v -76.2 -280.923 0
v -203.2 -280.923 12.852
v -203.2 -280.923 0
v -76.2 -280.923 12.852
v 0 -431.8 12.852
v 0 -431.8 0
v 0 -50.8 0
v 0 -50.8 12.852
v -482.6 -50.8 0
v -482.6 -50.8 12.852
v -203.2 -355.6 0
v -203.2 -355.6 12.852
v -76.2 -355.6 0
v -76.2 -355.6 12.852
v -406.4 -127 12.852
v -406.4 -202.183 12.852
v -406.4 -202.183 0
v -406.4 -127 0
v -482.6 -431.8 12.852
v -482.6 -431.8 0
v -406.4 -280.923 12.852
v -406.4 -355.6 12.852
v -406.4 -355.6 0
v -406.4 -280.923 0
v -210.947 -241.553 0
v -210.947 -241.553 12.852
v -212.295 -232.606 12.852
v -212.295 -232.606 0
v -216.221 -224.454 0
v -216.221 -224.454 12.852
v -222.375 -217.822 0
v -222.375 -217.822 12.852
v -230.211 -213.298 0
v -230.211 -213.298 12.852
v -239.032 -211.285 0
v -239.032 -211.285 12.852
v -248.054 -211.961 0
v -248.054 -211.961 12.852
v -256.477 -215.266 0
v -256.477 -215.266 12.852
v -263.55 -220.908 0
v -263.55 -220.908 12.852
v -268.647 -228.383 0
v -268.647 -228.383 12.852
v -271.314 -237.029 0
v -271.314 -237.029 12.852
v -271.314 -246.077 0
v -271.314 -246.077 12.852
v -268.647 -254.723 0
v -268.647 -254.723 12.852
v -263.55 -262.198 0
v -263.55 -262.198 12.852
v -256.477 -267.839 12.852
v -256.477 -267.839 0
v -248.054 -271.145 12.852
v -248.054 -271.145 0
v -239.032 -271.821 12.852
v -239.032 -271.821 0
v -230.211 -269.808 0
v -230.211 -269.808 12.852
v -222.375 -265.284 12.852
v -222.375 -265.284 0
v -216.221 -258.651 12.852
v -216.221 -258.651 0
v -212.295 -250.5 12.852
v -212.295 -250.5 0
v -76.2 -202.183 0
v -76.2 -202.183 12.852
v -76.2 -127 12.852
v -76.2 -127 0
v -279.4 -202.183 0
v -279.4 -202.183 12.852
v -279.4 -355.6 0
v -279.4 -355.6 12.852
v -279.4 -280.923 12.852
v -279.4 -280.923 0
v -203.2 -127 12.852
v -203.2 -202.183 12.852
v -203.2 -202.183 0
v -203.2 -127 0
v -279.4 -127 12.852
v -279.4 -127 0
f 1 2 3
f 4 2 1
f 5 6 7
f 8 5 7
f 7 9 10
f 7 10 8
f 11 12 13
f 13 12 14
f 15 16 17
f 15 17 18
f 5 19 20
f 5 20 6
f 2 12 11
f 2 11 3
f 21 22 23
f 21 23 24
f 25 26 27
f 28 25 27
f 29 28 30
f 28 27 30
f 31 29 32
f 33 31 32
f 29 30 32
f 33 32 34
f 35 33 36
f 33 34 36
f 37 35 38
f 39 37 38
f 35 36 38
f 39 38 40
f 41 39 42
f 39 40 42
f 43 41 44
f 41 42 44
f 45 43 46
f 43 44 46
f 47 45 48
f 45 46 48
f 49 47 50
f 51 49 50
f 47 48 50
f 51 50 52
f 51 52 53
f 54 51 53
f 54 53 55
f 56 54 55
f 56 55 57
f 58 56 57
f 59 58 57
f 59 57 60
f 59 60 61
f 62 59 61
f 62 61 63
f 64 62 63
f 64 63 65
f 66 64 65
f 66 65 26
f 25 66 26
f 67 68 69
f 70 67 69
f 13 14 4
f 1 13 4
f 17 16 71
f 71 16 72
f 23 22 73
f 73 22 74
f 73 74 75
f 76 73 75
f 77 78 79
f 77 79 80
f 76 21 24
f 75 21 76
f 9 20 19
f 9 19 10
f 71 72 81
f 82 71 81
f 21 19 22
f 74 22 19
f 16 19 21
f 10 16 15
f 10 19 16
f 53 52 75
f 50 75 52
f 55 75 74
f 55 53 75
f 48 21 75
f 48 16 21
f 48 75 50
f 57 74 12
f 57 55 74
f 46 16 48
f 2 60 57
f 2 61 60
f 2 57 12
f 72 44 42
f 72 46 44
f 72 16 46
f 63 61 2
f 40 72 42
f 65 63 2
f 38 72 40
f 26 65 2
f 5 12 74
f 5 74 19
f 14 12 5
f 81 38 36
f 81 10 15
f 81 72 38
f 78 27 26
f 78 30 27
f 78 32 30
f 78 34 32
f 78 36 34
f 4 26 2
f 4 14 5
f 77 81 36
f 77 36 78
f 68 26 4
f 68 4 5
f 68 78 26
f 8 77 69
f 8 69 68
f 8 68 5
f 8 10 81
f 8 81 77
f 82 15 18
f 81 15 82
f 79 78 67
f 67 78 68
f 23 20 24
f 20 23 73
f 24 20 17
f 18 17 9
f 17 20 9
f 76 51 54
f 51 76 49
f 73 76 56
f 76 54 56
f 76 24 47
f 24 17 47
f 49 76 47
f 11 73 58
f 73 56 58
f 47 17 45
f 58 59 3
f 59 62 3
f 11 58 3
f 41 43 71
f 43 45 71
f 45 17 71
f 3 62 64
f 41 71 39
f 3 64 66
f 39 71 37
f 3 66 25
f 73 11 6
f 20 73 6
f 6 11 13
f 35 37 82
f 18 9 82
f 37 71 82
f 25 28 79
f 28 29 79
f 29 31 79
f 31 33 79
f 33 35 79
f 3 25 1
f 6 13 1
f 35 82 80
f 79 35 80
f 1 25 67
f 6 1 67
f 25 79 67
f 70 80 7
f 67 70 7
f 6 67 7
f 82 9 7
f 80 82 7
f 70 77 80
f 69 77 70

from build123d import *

# Parameters (mm, degrees)
F0_W      = 482.6
F0_H      = 482.6
F1_DEPTH  = 12.8524
F2_W      = 330.2
F2_H      = 12.8524
F2_W_2    = 76.2
F3_DEPTH  = 50.8
F4_W      = 330.2
F4_H      = 12.8524
F4_W_2    = 76.2
F5_DEPTH  = 50.8
F8_W      = 127
F8_H      = 74.6771698952
F8_H_2    = 75.1828301048
F9_W      = 127
F9_H      = 74.6771698952
F10_DEPTH = 25.4
F12_DEPTH = 50.8
F13_DEPTH = 50.8
F14_R     = 30.353
F15_DEPTH = 25.4


with BuildPart() as f1:
    # F0 (on Top) → F1 (new body)
    with BuildSketch(Plane.XY):
        with Locations((-241.3, -241.3)):
            Rectangle(F0_W, F0_H)
    extrude(amount=F1_DEPTH)

    # F2 (on face) → F3 (cut)
    with BuildSketch(Plane.XZ.offset(482.6)):
        with Locations((-241.3, 6.4262)):
            Rectangle(F2_W, F2_H)
        with Locations((-444.5, 6.4262)):
            Rectangle(F2_W_2, F2_H)
    extrude(amount=-F3_DEPTH, mode=Mode.SUBTRACT)

    # F4 (on face) → F5 (cut)
    with BuildSketch(Plane(origin=(0, 0, 0), x_dir=(-1, 0, 0), z_dir=(0, 1, 0))):
        with Locations((241.3, 6.4262)):
            Rectangle(F4_W, F4_H)
        with Locations((38.1, 6.4262)):
            Rectangle(F4_W_2, F4_H)
    extrude(amount=-F5_DEPTH, mode=Mode.SUBTRACT)

    # F8 (on face) + F9 (on face) → F10 (cut)
    with BuildSketch(Plane.XY.offset(12.8524)):
        with Locations((-139.7, -318.2614150524)):
            Rectangle(F8_W, F8_H)
        with Locations((-342.9, -164.5914150524)):
            Rectangle(F8_W, F8_H_2)
        with Locations((-139.7, -164.5914150524)):
            Rectangle(F8_W, F8_H_2)
    with BuildSketch(Plane.XY.offset(12.8524)):
        with Locations((-342.9, -318.2614150524)):
            Rectangle(F9_W, F9_H)
    extrude(amount=-F10_DEPTH, mode=Mode.SUBTRACT)

    # F12 (cut): a face of the model
    f12_faces = [f1.faces().sort_by_distance(p)[0] for p in [
        (-38.1, -482.6, 6.4262),
    ]]
    extrude(f12_faces, amount=-F12_DEPTH, mode=Mode.SUBTRACT)

    # F13 (cut): a face of the model
    f13_faces = [f1.faces().sort_by_distance(p)[0] for p in [
        (-444.5, 0, 6.4262),
    ]]
    extrude(f13_faces, amount=-F13_DEPTH, mode=Mode.SUBTRACT)

    # F14 (on face) → F15 (cut)
    with BuildSketch(Plane.XY.offset(12.8524)):
        with Locations((-241.3, -241.5528301048)):
            Circle(F14_R)
    extrude(amount=-F15_DEPTH, mode=Mode.SUBTRACT)


solid = f1.part
